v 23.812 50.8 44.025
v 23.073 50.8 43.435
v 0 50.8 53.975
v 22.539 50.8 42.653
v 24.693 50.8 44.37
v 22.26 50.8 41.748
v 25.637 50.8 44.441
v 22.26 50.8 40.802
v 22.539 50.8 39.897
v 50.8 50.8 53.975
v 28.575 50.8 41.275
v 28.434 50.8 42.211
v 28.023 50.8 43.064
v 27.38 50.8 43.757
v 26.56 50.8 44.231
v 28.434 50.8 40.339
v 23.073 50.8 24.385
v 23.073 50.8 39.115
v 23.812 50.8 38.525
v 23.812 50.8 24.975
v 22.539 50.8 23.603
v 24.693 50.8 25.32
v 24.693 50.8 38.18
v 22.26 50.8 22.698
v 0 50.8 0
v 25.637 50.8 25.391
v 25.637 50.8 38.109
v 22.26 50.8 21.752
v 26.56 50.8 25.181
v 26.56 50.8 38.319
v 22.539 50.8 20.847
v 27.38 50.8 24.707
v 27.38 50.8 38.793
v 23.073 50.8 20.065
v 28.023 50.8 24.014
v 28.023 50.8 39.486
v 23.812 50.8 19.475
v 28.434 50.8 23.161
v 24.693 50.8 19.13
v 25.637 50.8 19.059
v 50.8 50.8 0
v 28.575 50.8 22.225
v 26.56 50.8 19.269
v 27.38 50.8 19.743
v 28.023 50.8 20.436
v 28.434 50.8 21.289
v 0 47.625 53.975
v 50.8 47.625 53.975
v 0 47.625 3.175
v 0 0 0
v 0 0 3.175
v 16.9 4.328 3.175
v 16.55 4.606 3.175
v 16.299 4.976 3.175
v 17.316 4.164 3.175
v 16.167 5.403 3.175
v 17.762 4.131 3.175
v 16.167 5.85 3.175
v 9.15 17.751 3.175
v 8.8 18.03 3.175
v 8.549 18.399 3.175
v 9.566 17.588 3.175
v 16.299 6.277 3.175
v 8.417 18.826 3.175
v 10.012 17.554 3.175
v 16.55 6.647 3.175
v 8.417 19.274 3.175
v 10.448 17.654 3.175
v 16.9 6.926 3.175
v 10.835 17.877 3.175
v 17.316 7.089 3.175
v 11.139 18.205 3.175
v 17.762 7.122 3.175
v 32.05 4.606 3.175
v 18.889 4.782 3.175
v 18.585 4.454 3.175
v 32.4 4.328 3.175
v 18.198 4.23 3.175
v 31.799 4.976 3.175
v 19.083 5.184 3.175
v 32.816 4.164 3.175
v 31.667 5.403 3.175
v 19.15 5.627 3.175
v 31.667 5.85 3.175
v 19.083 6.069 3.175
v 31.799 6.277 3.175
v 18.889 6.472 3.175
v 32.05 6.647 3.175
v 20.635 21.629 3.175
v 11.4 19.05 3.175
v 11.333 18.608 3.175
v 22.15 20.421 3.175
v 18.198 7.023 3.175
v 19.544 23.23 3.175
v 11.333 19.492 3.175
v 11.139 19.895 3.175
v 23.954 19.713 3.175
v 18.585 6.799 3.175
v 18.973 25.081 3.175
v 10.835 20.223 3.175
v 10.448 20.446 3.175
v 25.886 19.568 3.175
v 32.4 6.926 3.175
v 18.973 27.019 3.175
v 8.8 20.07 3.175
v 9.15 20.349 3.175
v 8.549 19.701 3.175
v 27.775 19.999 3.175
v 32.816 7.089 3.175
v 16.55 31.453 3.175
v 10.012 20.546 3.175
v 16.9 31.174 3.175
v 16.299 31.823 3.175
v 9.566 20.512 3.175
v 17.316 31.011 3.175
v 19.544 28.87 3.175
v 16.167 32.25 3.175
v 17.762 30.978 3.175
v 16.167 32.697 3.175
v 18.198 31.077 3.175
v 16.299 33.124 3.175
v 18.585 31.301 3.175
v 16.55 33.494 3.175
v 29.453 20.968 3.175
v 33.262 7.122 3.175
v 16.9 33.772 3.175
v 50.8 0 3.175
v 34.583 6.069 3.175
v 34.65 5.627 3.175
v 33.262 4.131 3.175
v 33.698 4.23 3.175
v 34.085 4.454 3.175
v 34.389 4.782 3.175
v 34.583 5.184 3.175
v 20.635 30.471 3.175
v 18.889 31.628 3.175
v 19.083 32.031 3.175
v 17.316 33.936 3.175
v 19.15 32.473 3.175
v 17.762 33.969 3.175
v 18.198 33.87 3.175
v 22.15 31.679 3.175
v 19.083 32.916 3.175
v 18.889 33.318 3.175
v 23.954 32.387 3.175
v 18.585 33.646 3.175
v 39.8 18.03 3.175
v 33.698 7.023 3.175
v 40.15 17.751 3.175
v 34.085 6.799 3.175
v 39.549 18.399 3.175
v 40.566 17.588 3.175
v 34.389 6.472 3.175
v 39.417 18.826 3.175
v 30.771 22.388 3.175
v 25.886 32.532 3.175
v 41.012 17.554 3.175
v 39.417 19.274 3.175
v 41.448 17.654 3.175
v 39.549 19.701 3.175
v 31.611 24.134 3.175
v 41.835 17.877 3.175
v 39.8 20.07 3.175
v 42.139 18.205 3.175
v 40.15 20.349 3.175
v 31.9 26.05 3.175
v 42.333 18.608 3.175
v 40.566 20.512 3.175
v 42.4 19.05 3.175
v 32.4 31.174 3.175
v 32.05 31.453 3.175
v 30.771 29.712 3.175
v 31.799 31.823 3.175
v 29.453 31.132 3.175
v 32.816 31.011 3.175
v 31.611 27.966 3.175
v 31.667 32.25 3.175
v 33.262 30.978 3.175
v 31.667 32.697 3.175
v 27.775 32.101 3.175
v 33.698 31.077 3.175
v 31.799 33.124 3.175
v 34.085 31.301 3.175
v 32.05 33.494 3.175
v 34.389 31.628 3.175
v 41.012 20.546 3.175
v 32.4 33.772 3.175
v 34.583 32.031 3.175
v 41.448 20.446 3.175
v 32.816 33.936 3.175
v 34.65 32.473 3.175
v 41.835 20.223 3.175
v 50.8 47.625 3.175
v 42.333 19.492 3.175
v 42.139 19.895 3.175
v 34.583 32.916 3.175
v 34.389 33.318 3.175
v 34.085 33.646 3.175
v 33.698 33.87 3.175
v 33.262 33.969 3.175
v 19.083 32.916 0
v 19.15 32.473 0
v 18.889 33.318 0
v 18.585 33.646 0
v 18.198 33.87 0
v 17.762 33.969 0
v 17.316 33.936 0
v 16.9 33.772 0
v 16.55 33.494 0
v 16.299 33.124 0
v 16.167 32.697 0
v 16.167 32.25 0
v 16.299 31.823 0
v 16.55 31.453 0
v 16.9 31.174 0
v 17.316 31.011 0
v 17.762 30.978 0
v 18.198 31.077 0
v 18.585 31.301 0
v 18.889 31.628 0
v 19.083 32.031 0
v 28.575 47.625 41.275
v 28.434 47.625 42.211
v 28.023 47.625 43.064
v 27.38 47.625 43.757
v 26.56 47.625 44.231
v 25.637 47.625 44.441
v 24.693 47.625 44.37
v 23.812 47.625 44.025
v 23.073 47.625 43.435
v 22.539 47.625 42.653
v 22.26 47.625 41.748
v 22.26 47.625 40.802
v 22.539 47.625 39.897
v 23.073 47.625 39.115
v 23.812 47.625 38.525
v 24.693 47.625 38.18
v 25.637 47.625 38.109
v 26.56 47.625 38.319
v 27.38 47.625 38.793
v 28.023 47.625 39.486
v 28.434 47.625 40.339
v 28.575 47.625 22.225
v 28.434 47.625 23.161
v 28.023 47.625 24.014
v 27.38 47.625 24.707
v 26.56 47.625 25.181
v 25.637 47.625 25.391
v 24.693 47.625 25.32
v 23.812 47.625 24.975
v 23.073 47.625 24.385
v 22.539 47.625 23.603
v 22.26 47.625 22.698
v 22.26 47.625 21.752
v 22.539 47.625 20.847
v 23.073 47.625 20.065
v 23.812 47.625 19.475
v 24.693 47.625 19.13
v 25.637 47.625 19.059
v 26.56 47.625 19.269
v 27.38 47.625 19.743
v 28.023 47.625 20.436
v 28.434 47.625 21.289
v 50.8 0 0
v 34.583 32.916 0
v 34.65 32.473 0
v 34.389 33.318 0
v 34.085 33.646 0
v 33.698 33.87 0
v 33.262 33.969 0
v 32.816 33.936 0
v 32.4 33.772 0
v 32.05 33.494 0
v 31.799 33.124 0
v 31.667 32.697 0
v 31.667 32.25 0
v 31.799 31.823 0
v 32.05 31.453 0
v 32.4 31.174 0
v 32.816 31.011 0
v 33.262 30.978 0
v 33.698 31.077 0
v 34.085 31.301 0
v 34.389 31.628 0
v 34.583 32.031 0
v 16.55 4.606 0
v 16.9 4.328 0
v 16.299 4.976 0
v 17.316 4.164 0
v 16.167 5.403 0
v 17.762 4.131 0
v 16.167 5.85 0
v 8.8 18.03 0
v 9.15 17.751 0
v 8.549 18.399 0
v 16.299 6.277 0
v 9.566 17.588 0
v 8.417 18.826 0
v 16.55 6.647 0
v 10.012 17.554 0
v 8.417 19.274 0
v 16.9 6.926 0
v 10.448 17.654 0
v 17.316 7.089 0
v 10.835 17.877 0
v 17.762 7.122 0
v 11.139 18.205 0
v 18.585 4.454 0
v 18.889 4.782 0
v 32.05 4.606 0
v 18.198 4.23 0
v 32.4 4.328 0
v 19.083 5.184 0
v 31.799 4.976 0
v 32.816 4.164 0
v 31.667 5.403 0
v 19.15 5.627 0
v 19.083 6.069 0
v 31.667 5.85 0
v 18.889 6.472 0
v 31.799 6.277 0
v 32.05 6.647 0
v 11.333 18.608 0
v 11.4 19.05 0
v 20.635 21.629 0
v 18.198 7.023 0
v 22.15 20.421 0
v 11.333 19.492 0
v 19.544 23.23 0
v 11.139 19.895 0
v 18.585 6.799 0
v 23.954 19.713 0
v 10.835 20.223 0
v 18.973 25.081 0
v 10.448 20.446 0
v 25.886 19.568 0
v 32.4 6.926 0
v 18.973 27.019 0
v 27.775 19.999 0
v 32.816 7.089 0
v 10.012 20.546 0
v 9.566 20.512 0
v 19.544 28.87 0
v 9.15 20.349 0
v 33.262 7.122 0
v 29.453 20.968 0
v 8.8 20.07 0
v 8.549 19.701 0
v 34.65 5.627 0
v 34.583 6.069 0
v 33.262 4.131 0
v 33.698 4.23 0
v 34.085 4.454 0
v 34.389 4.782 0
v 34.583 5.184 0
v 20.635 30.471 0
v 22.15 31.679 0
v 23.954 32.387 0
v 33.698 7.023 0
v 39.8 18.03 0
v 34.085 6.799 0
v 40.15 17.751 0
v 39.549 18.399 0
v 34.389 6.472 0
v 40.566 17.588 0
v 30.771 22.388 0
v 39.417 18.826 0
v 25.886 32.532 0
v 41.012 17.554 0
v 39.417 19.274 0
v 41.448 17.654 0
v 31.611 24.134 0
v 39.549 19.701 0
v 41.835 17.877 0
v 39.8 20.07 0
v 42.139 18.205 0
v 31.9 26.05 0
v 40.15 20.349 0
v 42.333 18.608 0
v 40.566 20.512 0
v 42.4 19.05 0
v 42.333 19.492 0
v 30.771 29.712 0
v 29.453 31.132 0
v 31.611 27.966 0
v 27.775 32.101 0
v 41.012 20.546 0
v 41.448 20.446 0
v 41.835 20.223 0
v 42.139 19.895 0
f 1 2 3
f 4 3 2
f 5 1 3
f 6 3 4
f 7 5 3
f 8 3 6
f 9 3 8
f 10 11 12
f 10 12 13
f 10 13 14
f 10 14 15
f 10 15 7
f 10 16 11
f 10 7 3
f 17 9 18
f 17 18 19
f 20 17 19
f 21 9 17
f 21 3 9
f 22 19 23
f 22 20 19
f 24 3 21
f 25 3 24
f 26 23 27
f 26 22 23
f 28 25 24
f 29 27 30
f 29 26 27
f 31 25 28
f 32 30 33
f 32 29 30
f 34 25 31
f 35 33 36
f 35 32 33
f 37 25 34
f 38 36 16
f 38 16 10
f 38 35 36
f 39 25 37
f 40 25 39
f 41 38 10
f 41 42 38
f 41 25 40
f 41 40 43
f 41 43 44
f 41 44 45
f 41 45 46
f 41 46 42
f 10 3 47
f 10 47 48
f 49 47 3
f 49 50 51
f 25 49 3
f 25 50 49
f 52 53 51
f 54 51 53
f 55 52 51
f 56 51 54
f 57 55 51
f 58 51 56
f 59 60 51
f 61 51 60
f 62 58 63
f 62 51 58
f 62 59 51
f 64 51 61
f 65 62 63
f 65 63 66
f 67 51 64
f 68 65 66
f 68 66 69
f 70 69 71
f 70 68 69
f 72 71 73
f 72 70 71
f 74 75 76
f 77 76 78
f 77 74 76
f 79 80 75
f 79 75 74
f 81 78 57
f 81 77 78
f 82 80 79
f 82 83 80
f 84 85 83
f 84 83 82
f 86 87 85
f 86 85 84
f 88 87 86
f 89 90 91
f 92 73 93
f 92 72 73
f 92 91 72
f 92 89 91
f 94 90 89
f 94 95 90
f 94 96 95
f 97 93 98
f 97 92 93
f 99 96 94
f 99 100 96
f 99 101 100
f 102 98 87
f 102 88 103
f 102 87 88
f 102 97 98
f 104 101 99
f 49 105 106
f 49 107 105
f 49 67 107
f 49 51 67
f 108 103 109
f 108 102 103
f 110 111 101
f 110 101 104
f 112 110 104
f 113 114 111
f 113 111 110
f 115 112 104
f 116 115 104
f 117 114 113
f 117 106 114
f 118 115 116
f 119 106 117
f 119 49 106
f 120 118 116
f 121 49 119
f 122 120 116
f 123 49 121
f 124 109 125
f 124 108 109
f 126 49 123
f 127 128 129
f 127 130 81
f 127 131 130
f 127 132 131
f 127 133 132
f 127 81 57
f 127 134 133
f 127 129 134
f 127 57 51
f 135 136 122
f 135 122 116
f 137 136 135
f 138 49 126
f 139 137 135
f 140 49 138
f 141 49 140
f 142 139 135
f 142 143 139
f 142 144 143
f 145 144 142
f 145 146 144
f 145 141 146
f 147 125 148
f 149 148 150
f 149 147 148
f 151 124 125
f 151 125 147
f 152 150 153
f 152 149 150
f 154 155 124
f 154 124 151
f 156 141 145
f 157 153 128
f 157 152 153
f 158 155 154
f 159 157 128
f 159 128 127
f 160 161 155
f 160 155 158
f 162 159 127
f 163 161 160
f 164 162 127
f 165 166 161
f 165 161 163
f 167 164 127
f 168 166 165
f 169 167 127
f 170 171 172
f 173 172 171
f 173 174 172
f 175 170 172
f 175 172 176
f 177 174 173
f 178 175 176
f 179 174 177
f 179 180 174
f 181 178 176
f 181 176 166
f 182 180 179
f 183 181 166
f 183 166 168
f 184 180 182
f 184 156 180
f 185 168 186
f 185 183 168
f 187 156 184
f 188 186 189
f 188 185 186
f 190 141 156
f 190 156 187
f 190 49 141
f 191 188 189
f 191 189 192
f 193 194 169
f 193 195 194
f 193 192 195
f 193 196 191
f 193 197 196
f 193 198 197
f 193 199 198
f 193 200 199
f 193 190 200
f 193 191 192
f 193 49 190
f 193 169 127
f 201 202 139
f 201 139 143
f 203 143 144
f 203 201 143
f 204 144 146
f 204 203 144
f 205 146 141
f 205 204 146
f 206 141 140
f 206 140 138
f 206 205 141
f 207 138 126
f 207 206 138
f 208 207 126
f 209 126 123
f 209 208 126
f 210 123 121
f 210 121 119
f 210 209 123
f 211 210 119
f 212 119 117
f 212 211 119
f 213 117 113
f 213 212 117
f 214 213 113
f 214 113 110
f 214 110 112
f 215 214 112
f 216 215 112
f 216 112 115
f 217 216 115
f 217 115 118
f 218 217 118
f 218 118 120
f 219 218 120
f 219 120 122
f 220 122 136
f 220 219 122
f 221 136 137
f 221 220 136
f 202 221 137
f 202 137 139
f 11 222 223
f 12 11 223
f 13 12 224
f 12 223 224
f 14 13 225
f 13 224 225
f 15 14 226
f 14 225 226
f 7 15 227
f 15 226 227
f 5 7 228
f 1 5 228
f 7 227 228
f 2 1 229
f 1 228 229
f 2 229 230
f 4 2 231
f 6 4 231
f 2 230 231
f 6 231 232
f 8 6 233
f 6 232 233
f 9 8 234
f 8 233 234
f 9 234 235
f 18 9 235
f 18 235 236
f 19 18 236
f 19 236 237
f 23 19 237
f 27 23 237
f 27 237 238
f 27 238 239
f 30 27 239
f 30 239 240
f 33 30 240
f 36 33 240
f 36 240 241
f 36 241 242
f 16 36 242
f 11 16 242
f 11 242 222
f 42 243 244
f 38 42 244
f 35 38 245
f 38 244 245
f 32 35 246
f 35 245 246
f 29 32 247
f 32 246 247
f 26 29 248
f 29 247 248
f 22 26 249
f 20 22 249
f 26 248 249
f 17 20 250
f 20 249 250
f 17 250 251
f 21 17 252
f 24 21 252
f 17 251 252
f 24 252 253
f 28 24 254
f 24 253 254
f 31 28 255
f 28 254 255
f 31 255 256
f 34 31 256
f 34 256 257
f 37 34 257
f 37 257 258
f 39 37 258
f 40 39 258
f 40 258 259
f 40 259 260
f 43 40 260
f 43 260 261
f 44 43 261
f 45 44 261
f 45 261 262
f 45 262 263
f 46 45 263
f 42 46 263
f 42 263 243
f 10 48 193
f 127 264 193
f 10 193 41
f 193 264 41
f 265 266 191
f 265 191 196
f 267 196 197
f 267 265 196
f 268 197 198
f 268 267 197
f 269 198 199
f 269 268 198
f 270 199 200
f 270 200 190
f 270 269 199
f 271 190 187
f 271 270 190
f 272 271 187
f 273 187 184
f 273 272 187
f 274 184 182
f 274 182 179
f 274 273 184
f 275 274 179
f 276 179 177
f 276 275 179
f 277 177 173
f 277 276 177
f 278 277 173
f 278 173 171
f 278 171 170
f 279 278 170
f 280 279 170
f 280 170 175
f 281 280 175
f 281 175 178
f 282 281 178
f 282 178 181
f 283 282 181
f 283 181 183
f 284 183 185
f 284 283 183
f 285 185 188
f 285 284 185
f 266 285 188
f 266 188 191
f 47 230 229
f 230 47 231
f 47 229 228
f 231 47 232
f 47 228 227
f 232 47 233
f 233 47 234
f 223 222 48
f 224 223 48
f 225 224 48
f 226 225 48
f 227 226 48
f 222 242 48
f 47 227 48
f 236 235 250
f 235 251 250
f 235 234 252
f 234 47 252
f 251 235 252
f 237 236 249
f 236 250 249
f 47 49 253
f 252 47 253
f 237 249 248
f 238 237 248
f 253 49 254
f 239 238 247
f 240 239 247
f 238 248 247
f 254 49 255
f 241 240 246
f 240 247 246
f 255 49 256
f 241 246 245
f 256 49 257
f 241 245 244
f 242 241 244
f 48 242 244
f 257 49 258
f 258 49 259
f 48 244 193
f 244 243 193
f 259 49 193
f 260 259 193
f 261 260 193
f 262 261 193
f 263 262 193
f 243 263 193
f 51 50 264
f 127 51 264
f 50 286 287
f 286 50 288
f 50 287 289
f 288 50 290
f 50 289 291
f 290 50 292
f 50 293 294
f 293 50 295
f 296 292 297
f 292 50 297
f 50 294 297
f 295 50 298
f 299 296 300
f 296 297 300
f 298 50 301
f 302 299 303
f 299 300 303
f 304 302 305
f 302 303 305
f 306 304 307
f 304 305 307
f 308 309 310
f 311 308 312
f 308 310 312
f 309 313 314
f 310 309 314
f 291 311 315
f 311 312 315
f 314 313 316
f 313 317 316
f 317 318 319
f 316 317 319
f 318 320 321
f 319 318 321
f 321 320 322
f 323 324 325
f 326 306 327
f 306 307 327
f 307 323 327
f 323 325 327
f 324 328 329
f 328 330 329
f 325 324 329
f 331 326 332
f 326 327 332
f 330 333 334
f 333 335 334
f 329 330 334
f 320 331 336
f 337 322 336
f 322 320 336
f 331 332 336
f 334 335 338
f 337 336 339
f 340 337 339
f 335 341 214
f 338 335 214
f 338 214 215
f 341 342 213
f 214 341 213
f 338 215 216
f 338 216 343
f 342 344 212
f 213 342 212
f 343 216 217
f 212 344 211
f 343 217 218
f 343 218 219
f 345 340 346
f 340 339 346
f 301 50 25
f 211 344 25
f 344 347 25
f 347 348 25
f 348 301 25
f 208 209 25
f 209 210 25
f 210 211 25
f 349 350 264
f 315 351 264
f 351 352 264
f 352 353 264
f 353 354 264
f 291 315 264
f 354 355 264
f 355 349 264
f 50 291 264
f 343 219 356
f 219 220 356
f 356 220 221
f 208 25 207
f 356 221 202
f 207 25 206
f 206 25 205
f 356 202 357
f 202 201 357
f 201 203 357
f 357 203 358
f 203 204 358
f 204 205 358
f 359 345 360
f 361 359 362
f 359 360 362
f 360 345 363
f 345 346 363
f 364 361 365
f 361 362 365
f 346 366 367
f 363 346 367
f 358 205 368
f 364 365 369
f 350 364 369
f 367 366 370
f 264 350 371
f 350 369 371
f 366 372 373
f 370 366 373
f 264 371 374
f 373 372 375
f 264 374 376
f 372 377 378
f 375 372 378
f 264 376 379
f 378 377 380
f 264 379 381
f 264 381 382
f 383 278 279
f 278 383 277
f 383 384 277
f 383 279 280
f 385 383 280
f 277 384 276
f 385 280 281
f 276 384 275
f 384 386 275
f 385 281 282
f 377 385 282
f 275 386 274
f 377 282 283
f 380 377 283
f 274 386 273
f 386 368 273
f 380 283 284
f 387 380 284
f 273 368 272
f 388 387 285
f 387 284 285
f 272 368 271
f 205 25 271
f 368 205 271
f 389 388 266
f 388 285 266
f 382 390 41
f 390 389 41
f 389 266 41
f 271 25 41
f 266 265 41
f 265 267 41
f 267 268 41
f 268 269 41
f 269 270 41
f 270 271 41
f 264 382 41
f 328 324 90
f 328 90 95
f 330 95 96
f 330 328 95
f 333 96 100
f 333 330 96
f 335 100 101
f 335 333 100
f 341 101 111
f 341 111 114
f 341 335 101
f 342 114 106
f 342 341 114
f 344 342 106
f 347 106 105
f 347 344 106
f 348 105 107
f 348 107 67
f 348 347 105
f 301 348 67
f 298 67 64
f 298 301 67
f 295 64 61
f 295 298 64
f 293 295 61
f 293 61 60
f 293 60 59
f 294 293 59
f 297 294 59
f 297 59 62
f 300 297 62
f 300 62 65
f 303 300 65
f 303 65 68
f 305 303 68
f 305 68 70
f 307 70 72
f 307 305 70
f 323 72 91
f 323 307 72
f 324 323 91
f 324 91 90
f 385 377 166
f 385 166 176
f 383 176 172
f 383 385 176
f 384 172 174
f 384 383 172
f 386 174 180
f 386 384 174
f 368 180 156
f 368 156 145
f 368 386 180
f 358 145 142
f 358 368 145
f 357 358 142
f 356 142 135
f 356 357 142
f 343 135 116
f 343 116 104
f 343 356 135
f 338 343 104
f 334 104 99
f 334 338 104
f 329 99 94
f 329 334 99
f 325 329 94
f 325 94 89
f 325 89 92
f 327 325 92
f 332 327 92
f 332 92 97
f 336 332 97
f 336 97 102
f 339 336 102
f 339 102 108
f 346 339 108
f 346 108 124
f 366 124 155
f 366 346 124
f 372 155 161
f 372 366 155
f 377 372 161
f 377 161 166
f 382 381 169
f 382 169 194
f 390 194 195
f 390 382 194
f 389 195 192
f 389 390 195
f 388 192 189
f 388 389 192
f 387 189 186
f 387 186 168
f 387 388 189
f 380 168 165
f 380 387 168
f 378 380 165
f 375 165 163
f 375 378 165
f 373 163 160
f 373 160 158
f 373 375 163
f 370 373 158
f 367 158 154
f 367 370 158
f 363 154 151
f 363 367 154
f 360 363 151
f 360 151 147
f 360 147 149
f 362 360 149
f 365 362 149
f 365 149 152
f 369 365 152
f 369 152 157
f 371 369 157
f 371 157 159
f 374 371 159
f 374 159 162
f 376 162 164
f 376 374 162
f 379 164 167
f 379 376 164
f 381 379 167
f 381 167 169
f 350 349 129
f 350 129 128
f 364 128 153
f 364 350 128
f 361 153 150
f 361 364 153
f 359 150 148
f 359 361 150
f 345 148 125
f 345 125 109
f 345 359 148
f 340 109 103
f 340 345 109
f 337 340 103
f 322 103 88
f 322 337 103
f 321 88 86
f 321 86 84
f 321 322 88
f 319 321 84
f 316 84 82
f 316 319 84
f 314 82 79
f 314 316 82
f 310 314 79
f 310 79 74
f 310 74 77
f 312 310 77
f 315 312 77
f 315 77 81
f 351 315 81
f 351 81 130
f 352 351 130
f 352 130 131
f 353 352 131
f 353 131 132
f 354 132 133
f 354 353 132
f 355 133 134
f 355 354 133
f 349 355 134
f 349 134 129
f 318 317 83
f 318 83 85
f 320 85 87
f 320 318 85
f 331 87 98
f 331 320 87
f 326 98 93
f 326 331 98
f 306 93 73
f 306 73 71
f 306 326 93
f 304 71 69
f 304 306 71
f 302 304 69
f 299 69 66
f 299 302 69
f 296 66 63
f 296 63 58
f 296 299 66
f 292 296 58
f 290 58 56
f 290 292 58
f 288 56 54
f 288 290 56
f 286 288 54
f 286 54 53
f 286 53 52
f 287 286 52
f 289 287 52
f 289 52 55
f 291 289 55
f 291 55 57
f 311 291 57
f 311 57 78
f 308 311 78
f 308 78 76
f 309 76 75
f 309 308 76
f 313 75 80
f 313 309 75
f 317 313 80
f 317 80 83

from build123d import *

# Parameters (mm, degrees)
SKETCH1_W           = 50.8
SKETCH1_H           = 50.8
SKETCH1_R           = 6.5
SKETCH1_R_2         = 1.5
BOSS_EXTRUDE1_DEPTH = 3.175
SKETCH2_W           = 50.8
SKETCH2_H           = 3.175
BOSS_EXTRUDE2_DEPTH = 50.8
SKETCH3_R           = 3.175
CUT_EXTRUDE1_DEPTH  = 4.175


with BuildPart() as part:
    # Sketch1 → Boss-Extrude1 (new body)
    with BuildSketch(Plane.XY):
        with Locations((25.4, 25.4)):
            Rectangle(SKETCH1_W, SKETCH1_H)
        with Locations((25.4, 26.05)):
            Circle(SKETCH1_R, mode=Mode.SUBTRACT)
        with Locations((9.9, 19.05)):
            Circle(SKETCH1_R_2, mode=Mode.SUBTRACT)
        with Locations((40.9, 19.05)):
            Circle(SKETCH1_R_2, mode=Mode.SUBTRACT)
        with Locations((33.15, 5.626606241)):
            Circle(SKETCH1_R_2, mode=Mode.SUBTRACT)
        with Locations((17.65, 5.626606241)):
            Circle(SKETCH1_R_2, mode=Mode.SUBTRACT)
        with Locations((17.65, 32.473393759)):
            Circle(SKETCH1_R_2, mode=Mode.SUBTRACT)
        with Locations((33.15, 32.473393759)):
            Circle(SKETCH1_R_2, mode=Mode.SUBTRACT)
    extrude(amount=BOSS_EXTRUDE1_DEPTH)

    # Sketch2 → Boss-Extrude2 (add)
    with BuildSketch(Plane.XY.offset(3.175)):
        with Locations((25.4, 49.2125)):
            Rectangle(SKETCH2_W, SKETCH2_H)
    extrude(amount=BOSS_EXTRUDE2_DEPTH)

    # Sketch3 → Cut-Extrude1 (cut, through all)
    with BuildSketch(Plane.XZ.offset(-47.625)):
        with Locations((25.4, 41.275)):
            Circle(SKETCH3_R)
        with Locations((25.4, 22.225)):
            Circle(SKETCH3_R)
    extrude(amount=-CUT_EXTRUDE1_DEPTH, mode=Mode.SUBTRACT)


solid = part.part
